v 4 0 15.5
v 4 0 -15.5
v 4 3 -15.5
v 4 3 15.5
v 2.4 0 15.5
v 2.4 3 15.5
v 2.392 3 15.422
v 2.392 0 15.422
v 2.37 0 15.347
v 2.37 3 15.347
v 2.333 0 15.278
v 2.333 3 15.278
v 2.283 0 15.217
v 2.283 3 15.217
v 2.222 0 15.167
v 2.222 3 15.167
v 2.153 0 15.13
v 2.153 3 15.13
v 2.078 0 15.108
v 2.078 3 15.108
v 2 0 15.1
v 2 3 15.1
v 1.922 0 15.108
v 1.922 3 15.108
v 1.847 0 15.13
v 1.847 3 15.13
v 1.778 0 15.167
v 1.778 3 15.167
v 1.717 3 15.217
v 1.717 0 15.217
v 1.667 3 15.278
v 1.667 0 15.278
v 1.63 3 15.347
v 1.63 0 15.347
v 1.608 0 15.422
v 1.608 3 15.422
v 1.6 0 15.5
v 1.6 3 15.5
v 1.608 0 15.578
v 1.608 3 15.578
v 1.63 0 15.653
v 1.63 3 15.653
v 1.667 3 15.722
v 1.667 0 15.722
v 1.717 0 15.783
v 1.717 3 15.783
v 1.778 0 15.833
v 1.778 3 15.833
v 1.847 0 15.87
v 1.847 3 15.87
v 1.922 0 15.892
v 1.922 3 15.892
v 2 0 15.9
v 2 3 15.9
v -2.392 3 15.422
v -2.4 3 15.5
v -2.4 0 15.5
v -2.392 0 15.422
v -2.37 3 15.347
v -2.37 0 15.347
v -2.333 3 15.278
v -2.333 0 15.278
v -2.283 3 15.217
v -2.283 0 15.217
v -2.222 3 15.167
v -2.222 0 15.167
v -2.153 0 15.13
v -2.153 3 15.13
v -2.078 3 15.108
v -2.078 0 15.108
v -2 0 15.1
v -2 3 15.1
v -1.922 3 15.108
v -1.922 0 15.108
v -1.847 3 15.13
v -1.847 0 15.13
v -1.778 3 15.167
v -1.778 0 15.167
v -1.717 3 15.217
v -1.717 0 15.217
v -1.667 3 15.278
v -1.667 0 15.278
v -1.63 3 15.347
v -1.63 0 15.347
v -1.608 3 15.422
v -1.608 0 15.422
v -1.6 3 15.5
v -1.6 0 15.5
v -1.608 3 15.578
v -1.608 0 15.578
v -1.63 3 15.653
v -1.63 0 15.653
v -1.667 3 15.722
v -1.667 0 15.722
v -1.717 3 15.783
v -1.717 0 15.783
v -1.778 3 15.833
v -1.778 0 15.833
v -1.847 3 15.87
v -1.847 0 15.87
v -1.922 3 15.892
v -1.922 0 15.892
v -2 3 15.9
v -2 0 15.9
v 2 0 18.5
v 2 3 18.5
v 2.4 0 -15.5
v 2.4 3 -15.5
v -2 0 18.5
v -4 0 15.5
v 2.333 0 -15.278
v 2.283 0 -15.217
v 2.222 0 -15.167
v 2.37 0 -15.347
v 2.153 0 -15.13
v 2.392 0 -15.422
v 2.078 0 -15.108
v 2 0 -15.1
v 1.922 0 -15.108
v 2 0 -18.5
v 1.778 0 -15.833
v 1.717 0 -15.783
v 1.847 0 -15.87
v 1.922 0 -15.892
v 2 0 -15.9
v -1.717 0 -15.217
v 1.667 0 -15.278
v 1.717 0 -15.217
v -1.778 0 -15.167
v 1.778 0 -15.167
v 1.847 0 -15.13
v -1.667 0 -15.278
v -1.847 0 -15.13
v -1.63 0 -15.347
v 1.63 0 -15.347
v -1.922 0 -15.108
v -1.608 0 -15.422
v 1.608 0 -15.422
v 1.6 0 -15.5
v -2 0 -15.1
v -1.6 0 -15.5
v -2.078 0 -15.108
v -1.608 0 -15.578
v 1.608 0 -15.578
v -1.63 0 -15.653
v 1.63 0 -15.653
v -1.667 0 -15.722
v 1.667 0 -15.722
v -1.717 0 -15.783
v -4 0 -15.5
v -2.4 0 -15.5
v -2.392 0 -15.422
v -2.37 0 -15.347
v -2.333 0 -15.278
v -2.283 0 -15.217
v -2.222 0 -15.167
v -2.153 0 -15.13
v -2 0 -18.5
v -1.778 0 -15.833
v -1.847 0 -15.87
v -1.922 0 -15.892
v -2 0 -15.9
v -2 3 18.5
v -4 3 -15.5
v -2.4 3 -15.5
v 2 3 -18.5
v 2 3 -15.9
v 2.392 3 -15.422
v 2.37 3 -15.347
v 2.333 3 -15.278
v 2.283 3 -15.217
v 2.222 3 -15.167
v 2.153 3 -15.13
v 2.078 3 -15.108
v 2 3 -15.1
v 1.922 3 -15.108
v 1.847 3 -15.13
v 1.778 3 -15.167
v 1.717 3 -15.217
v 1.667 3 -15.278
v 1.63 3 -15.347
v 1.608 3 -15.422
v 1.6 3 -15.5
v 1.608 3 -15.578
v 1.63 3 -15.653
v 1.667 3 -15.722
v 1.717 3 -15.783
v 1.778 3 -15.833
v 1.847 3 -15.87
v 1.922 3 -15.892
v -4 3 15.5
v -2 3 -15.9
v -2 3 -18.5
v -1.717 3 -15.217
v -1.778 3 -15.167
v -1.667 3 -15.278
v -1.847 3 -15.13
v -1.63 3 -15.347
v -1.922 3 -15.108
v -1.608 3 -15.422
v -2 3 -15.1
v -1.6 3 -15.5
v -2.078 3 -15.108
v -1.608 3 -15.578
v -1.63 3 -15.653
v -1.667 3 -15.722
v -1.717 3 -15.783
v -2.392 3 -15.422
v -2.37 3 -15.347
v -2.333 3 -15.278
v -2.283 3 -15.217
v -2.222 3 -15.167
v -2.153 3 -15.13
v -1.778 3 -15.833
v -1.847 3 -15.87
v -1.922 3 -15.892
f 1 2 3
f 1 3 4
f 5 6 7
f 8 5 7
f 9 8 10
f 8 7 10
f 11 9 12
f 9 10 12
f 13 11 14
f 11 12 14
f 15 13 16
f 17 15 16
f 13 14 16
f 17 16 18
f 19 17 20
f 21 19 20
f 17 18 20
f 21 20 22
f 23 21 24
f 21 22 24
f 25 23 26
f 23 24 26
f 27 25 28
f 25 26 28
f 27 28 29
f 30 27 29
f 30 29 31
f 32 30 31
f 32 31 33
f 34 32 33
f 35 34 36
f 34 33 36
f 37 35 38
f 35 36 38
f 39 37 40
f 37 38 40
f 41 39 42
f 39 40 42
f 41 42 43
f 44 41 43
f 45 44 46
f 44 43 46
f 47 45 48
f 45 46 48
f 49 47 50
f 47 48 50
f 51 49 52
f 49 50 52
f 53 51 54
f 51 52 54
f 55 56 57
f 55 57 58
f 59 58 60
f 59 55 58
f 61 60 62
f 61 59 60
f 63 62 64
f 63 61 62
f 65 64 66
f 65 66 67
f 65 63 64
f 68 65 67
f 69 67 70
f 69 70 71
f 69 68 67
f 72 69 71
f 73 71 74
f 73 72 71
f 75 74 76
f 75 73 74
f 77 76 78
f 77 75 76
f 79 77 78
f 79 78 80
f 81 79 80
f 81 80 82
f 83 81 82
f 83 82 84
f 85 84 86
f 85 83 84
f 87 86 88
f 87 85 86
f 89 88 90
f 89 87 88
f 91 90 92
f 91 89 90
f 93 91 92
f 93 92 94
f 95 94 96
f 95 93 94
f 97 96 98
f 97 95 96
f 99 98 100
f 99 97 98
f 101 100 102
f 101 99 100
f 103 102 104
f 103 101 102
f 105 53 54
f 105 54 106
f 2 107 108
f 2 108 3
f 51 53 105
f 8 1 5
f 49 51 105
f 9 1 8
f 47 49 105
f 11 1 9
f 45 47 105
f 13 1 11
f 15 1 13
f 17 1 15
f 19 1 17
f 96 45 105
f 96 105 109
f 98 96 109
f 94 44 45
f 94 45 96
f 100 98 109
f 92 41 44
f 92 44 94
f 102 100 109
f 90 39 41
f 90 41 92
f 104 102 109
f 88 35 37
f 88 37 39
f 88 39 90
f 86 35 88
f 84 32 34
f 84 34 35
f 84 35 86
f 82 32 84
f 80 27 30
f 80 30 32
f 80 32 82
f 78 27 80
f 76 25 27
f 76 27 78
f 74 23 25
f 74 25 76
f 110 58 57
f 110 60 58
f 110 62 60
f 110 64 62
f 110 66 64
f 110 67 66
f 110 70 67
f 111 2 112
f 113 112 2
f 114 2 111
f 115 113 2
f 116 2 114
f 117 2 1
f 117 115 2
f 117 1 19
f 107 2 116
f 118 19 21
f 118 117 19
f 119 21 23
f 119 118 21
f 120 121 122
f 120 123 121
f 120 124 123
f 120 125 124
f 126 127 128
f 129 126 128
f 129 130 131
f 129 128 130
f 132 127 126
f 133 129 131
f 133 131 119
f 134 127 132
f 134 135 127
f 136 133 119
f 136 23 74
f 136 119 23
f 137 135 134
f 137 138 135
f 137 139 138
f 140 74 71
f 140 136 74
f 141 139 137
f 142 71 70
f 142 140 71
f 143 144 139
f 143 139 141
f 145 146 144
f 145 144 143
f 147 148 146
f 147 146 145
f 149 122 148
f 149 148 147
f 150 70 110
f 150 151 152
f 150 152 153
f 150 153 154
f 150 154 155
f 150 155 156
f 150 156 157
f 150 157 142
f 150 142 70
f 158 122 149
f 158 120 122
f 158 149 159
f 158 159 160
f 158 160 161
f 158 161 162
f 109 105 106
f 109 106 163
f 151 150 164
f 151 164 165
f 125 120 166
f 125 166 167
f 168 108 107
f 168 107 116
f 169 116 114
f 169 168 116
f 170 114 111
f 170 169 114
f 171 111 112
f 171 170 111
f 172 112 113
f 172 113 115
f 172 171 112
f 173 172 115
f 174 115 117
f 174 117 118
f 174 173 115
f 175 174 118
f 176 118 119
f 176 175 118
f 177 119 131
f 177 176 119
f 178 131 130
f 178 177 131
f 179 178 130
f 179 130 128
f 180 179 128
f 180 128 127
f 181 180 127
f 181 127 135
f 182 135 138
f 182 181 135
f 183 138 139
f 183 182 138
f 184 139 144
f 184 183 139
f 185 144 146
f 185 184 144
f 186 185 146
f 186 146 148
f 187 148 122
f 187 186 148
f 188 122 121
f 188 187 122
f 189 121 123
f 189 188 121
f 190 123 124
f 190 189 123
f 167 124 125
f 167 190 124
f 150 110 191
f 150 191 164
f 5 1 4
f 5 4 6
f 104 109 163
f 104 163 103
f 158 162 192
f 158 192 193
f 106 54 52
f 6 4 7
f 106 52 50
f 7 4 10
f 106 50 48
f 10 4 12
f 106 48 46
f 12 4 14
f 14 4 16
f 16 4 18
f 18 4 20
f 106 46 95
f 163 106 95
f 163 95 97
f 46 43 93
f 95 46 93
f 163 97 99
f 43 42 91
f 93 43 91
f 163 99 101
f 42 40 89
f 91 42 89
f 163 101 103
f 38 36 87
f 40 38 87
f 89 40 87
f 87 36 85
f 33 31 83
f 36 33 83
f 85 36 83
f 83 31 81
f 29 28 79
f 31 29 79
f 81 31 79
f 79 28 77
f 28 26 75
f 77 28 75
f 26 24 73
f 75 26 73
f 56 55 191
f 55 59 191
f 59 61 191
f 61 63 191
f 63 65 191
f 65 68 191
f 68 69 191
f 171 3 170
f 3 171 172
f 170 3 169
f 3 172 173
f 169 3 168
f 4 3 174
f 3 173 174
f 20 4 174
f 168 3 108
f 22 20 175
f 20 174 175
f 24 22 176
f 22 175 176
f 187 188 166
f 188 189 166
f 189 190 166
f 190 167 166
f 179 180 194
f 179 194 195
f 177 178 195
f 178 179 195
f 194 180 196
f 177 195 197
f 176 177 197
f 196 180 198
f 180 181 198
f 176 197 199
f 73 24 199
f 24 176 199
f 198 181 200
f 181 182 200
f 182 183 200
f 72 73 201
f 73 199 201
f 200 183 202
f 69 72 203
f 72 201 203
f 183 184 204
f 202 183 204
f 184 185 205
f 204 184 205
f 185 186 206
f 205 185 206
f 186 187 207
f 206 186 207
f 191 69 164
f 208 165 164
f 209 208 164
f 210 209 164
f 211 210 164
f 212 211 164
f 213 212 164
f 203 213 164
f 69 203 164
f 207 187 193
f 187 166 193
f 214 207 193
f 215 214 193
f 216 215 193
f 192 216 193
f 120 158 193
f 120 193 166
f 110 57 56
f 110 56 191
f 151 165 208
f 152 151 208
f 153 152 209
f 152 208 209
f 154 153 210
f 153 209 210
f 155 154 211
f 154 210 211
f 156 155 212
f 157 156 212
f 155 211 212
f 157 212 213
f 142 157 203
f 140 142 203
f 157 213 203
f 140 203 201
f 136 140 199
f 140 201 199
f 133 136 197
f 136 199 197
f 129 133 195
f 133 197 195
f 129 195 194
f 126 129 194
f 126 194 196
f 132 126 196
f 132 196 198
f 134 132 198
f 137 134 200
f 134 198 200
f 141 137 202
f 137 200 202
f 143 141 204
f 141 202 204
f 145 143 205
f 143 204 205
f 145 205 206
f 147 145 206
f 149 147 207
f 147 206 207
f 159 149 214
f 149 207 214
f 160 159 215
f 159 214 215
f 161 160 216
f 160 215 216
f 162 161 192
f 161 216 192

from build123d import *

# Parameters (mm, degrees)
BOSS_EXTRUDE2_DEPTH = 3
CUT_EXTRUDE5_DEPTH  = 3


with BuildPart() as part:
    # Sketch1 → Boss-Extrude2 (new body)
    with BuildSketch(Plane(origin=(0, 0, 0), x_dir=(1, 0, 0), z_dir=(0, 1, 0))):
        Polygon((4, 15.5), (4, -15.5), (2, -15.5), (2, -18.5), (-2, -18.5), (-2, -15.5), (-4, -15.5), (-4, 15.5), (-2, 15.5), (-2, 18.5), (2, 18.5), (2, 15.5), align=None)
    extrude(amount=BOSS_EXTRUDE2_DEPTH)

    # Sketch4 → Cut-Extrude5 (cut)
    with BuildSketch(Plane(origin=(0, 3, 0), x_dir=(1, 0, 0), z_dir=(0, 1, 0))):
        with BuildLine():
            Line((2, 15.9), (2, 15.5))
            Line((2, 15.5), (2.4, 15.5))
            ThreePointArc((2.4, 15.5), (1.717157288, 15.217157288), (2, 15.9))
        make_face()
        with BuildLine():
            Line((-2, 15.5), (-2.4, 15.5))
            ThreePointArc((-2.4, 15.5), (-1.717157288, 15.217157288), (-2, 15.9))
            Line((-2, 15.9), (-2, 15.5))
        make_face()
        with BuildLine():
            Line((-2, -15.9), (-2, -15.5))
            Line((-2, -15.5), (-2.4, -15.5))
            ThreePointArc((-2.4, -15.5), (-1.717157288, -15.217157288), (-2, -15.9))
        make_face()
        with BuildLine():
            Line((2, -15.5), (2.4, -15.5))
            ThreePointArc((2.4, -15.5), (1.717157288, -15.217157288), (2, -15.9))
            Line((2, -15.9), (2, -15.5))
        make_face()
    extrude(amount=-CUT_EXTRUDE5_DEPTH, mode=Mode.SUBTRACT)


solid = part.part
